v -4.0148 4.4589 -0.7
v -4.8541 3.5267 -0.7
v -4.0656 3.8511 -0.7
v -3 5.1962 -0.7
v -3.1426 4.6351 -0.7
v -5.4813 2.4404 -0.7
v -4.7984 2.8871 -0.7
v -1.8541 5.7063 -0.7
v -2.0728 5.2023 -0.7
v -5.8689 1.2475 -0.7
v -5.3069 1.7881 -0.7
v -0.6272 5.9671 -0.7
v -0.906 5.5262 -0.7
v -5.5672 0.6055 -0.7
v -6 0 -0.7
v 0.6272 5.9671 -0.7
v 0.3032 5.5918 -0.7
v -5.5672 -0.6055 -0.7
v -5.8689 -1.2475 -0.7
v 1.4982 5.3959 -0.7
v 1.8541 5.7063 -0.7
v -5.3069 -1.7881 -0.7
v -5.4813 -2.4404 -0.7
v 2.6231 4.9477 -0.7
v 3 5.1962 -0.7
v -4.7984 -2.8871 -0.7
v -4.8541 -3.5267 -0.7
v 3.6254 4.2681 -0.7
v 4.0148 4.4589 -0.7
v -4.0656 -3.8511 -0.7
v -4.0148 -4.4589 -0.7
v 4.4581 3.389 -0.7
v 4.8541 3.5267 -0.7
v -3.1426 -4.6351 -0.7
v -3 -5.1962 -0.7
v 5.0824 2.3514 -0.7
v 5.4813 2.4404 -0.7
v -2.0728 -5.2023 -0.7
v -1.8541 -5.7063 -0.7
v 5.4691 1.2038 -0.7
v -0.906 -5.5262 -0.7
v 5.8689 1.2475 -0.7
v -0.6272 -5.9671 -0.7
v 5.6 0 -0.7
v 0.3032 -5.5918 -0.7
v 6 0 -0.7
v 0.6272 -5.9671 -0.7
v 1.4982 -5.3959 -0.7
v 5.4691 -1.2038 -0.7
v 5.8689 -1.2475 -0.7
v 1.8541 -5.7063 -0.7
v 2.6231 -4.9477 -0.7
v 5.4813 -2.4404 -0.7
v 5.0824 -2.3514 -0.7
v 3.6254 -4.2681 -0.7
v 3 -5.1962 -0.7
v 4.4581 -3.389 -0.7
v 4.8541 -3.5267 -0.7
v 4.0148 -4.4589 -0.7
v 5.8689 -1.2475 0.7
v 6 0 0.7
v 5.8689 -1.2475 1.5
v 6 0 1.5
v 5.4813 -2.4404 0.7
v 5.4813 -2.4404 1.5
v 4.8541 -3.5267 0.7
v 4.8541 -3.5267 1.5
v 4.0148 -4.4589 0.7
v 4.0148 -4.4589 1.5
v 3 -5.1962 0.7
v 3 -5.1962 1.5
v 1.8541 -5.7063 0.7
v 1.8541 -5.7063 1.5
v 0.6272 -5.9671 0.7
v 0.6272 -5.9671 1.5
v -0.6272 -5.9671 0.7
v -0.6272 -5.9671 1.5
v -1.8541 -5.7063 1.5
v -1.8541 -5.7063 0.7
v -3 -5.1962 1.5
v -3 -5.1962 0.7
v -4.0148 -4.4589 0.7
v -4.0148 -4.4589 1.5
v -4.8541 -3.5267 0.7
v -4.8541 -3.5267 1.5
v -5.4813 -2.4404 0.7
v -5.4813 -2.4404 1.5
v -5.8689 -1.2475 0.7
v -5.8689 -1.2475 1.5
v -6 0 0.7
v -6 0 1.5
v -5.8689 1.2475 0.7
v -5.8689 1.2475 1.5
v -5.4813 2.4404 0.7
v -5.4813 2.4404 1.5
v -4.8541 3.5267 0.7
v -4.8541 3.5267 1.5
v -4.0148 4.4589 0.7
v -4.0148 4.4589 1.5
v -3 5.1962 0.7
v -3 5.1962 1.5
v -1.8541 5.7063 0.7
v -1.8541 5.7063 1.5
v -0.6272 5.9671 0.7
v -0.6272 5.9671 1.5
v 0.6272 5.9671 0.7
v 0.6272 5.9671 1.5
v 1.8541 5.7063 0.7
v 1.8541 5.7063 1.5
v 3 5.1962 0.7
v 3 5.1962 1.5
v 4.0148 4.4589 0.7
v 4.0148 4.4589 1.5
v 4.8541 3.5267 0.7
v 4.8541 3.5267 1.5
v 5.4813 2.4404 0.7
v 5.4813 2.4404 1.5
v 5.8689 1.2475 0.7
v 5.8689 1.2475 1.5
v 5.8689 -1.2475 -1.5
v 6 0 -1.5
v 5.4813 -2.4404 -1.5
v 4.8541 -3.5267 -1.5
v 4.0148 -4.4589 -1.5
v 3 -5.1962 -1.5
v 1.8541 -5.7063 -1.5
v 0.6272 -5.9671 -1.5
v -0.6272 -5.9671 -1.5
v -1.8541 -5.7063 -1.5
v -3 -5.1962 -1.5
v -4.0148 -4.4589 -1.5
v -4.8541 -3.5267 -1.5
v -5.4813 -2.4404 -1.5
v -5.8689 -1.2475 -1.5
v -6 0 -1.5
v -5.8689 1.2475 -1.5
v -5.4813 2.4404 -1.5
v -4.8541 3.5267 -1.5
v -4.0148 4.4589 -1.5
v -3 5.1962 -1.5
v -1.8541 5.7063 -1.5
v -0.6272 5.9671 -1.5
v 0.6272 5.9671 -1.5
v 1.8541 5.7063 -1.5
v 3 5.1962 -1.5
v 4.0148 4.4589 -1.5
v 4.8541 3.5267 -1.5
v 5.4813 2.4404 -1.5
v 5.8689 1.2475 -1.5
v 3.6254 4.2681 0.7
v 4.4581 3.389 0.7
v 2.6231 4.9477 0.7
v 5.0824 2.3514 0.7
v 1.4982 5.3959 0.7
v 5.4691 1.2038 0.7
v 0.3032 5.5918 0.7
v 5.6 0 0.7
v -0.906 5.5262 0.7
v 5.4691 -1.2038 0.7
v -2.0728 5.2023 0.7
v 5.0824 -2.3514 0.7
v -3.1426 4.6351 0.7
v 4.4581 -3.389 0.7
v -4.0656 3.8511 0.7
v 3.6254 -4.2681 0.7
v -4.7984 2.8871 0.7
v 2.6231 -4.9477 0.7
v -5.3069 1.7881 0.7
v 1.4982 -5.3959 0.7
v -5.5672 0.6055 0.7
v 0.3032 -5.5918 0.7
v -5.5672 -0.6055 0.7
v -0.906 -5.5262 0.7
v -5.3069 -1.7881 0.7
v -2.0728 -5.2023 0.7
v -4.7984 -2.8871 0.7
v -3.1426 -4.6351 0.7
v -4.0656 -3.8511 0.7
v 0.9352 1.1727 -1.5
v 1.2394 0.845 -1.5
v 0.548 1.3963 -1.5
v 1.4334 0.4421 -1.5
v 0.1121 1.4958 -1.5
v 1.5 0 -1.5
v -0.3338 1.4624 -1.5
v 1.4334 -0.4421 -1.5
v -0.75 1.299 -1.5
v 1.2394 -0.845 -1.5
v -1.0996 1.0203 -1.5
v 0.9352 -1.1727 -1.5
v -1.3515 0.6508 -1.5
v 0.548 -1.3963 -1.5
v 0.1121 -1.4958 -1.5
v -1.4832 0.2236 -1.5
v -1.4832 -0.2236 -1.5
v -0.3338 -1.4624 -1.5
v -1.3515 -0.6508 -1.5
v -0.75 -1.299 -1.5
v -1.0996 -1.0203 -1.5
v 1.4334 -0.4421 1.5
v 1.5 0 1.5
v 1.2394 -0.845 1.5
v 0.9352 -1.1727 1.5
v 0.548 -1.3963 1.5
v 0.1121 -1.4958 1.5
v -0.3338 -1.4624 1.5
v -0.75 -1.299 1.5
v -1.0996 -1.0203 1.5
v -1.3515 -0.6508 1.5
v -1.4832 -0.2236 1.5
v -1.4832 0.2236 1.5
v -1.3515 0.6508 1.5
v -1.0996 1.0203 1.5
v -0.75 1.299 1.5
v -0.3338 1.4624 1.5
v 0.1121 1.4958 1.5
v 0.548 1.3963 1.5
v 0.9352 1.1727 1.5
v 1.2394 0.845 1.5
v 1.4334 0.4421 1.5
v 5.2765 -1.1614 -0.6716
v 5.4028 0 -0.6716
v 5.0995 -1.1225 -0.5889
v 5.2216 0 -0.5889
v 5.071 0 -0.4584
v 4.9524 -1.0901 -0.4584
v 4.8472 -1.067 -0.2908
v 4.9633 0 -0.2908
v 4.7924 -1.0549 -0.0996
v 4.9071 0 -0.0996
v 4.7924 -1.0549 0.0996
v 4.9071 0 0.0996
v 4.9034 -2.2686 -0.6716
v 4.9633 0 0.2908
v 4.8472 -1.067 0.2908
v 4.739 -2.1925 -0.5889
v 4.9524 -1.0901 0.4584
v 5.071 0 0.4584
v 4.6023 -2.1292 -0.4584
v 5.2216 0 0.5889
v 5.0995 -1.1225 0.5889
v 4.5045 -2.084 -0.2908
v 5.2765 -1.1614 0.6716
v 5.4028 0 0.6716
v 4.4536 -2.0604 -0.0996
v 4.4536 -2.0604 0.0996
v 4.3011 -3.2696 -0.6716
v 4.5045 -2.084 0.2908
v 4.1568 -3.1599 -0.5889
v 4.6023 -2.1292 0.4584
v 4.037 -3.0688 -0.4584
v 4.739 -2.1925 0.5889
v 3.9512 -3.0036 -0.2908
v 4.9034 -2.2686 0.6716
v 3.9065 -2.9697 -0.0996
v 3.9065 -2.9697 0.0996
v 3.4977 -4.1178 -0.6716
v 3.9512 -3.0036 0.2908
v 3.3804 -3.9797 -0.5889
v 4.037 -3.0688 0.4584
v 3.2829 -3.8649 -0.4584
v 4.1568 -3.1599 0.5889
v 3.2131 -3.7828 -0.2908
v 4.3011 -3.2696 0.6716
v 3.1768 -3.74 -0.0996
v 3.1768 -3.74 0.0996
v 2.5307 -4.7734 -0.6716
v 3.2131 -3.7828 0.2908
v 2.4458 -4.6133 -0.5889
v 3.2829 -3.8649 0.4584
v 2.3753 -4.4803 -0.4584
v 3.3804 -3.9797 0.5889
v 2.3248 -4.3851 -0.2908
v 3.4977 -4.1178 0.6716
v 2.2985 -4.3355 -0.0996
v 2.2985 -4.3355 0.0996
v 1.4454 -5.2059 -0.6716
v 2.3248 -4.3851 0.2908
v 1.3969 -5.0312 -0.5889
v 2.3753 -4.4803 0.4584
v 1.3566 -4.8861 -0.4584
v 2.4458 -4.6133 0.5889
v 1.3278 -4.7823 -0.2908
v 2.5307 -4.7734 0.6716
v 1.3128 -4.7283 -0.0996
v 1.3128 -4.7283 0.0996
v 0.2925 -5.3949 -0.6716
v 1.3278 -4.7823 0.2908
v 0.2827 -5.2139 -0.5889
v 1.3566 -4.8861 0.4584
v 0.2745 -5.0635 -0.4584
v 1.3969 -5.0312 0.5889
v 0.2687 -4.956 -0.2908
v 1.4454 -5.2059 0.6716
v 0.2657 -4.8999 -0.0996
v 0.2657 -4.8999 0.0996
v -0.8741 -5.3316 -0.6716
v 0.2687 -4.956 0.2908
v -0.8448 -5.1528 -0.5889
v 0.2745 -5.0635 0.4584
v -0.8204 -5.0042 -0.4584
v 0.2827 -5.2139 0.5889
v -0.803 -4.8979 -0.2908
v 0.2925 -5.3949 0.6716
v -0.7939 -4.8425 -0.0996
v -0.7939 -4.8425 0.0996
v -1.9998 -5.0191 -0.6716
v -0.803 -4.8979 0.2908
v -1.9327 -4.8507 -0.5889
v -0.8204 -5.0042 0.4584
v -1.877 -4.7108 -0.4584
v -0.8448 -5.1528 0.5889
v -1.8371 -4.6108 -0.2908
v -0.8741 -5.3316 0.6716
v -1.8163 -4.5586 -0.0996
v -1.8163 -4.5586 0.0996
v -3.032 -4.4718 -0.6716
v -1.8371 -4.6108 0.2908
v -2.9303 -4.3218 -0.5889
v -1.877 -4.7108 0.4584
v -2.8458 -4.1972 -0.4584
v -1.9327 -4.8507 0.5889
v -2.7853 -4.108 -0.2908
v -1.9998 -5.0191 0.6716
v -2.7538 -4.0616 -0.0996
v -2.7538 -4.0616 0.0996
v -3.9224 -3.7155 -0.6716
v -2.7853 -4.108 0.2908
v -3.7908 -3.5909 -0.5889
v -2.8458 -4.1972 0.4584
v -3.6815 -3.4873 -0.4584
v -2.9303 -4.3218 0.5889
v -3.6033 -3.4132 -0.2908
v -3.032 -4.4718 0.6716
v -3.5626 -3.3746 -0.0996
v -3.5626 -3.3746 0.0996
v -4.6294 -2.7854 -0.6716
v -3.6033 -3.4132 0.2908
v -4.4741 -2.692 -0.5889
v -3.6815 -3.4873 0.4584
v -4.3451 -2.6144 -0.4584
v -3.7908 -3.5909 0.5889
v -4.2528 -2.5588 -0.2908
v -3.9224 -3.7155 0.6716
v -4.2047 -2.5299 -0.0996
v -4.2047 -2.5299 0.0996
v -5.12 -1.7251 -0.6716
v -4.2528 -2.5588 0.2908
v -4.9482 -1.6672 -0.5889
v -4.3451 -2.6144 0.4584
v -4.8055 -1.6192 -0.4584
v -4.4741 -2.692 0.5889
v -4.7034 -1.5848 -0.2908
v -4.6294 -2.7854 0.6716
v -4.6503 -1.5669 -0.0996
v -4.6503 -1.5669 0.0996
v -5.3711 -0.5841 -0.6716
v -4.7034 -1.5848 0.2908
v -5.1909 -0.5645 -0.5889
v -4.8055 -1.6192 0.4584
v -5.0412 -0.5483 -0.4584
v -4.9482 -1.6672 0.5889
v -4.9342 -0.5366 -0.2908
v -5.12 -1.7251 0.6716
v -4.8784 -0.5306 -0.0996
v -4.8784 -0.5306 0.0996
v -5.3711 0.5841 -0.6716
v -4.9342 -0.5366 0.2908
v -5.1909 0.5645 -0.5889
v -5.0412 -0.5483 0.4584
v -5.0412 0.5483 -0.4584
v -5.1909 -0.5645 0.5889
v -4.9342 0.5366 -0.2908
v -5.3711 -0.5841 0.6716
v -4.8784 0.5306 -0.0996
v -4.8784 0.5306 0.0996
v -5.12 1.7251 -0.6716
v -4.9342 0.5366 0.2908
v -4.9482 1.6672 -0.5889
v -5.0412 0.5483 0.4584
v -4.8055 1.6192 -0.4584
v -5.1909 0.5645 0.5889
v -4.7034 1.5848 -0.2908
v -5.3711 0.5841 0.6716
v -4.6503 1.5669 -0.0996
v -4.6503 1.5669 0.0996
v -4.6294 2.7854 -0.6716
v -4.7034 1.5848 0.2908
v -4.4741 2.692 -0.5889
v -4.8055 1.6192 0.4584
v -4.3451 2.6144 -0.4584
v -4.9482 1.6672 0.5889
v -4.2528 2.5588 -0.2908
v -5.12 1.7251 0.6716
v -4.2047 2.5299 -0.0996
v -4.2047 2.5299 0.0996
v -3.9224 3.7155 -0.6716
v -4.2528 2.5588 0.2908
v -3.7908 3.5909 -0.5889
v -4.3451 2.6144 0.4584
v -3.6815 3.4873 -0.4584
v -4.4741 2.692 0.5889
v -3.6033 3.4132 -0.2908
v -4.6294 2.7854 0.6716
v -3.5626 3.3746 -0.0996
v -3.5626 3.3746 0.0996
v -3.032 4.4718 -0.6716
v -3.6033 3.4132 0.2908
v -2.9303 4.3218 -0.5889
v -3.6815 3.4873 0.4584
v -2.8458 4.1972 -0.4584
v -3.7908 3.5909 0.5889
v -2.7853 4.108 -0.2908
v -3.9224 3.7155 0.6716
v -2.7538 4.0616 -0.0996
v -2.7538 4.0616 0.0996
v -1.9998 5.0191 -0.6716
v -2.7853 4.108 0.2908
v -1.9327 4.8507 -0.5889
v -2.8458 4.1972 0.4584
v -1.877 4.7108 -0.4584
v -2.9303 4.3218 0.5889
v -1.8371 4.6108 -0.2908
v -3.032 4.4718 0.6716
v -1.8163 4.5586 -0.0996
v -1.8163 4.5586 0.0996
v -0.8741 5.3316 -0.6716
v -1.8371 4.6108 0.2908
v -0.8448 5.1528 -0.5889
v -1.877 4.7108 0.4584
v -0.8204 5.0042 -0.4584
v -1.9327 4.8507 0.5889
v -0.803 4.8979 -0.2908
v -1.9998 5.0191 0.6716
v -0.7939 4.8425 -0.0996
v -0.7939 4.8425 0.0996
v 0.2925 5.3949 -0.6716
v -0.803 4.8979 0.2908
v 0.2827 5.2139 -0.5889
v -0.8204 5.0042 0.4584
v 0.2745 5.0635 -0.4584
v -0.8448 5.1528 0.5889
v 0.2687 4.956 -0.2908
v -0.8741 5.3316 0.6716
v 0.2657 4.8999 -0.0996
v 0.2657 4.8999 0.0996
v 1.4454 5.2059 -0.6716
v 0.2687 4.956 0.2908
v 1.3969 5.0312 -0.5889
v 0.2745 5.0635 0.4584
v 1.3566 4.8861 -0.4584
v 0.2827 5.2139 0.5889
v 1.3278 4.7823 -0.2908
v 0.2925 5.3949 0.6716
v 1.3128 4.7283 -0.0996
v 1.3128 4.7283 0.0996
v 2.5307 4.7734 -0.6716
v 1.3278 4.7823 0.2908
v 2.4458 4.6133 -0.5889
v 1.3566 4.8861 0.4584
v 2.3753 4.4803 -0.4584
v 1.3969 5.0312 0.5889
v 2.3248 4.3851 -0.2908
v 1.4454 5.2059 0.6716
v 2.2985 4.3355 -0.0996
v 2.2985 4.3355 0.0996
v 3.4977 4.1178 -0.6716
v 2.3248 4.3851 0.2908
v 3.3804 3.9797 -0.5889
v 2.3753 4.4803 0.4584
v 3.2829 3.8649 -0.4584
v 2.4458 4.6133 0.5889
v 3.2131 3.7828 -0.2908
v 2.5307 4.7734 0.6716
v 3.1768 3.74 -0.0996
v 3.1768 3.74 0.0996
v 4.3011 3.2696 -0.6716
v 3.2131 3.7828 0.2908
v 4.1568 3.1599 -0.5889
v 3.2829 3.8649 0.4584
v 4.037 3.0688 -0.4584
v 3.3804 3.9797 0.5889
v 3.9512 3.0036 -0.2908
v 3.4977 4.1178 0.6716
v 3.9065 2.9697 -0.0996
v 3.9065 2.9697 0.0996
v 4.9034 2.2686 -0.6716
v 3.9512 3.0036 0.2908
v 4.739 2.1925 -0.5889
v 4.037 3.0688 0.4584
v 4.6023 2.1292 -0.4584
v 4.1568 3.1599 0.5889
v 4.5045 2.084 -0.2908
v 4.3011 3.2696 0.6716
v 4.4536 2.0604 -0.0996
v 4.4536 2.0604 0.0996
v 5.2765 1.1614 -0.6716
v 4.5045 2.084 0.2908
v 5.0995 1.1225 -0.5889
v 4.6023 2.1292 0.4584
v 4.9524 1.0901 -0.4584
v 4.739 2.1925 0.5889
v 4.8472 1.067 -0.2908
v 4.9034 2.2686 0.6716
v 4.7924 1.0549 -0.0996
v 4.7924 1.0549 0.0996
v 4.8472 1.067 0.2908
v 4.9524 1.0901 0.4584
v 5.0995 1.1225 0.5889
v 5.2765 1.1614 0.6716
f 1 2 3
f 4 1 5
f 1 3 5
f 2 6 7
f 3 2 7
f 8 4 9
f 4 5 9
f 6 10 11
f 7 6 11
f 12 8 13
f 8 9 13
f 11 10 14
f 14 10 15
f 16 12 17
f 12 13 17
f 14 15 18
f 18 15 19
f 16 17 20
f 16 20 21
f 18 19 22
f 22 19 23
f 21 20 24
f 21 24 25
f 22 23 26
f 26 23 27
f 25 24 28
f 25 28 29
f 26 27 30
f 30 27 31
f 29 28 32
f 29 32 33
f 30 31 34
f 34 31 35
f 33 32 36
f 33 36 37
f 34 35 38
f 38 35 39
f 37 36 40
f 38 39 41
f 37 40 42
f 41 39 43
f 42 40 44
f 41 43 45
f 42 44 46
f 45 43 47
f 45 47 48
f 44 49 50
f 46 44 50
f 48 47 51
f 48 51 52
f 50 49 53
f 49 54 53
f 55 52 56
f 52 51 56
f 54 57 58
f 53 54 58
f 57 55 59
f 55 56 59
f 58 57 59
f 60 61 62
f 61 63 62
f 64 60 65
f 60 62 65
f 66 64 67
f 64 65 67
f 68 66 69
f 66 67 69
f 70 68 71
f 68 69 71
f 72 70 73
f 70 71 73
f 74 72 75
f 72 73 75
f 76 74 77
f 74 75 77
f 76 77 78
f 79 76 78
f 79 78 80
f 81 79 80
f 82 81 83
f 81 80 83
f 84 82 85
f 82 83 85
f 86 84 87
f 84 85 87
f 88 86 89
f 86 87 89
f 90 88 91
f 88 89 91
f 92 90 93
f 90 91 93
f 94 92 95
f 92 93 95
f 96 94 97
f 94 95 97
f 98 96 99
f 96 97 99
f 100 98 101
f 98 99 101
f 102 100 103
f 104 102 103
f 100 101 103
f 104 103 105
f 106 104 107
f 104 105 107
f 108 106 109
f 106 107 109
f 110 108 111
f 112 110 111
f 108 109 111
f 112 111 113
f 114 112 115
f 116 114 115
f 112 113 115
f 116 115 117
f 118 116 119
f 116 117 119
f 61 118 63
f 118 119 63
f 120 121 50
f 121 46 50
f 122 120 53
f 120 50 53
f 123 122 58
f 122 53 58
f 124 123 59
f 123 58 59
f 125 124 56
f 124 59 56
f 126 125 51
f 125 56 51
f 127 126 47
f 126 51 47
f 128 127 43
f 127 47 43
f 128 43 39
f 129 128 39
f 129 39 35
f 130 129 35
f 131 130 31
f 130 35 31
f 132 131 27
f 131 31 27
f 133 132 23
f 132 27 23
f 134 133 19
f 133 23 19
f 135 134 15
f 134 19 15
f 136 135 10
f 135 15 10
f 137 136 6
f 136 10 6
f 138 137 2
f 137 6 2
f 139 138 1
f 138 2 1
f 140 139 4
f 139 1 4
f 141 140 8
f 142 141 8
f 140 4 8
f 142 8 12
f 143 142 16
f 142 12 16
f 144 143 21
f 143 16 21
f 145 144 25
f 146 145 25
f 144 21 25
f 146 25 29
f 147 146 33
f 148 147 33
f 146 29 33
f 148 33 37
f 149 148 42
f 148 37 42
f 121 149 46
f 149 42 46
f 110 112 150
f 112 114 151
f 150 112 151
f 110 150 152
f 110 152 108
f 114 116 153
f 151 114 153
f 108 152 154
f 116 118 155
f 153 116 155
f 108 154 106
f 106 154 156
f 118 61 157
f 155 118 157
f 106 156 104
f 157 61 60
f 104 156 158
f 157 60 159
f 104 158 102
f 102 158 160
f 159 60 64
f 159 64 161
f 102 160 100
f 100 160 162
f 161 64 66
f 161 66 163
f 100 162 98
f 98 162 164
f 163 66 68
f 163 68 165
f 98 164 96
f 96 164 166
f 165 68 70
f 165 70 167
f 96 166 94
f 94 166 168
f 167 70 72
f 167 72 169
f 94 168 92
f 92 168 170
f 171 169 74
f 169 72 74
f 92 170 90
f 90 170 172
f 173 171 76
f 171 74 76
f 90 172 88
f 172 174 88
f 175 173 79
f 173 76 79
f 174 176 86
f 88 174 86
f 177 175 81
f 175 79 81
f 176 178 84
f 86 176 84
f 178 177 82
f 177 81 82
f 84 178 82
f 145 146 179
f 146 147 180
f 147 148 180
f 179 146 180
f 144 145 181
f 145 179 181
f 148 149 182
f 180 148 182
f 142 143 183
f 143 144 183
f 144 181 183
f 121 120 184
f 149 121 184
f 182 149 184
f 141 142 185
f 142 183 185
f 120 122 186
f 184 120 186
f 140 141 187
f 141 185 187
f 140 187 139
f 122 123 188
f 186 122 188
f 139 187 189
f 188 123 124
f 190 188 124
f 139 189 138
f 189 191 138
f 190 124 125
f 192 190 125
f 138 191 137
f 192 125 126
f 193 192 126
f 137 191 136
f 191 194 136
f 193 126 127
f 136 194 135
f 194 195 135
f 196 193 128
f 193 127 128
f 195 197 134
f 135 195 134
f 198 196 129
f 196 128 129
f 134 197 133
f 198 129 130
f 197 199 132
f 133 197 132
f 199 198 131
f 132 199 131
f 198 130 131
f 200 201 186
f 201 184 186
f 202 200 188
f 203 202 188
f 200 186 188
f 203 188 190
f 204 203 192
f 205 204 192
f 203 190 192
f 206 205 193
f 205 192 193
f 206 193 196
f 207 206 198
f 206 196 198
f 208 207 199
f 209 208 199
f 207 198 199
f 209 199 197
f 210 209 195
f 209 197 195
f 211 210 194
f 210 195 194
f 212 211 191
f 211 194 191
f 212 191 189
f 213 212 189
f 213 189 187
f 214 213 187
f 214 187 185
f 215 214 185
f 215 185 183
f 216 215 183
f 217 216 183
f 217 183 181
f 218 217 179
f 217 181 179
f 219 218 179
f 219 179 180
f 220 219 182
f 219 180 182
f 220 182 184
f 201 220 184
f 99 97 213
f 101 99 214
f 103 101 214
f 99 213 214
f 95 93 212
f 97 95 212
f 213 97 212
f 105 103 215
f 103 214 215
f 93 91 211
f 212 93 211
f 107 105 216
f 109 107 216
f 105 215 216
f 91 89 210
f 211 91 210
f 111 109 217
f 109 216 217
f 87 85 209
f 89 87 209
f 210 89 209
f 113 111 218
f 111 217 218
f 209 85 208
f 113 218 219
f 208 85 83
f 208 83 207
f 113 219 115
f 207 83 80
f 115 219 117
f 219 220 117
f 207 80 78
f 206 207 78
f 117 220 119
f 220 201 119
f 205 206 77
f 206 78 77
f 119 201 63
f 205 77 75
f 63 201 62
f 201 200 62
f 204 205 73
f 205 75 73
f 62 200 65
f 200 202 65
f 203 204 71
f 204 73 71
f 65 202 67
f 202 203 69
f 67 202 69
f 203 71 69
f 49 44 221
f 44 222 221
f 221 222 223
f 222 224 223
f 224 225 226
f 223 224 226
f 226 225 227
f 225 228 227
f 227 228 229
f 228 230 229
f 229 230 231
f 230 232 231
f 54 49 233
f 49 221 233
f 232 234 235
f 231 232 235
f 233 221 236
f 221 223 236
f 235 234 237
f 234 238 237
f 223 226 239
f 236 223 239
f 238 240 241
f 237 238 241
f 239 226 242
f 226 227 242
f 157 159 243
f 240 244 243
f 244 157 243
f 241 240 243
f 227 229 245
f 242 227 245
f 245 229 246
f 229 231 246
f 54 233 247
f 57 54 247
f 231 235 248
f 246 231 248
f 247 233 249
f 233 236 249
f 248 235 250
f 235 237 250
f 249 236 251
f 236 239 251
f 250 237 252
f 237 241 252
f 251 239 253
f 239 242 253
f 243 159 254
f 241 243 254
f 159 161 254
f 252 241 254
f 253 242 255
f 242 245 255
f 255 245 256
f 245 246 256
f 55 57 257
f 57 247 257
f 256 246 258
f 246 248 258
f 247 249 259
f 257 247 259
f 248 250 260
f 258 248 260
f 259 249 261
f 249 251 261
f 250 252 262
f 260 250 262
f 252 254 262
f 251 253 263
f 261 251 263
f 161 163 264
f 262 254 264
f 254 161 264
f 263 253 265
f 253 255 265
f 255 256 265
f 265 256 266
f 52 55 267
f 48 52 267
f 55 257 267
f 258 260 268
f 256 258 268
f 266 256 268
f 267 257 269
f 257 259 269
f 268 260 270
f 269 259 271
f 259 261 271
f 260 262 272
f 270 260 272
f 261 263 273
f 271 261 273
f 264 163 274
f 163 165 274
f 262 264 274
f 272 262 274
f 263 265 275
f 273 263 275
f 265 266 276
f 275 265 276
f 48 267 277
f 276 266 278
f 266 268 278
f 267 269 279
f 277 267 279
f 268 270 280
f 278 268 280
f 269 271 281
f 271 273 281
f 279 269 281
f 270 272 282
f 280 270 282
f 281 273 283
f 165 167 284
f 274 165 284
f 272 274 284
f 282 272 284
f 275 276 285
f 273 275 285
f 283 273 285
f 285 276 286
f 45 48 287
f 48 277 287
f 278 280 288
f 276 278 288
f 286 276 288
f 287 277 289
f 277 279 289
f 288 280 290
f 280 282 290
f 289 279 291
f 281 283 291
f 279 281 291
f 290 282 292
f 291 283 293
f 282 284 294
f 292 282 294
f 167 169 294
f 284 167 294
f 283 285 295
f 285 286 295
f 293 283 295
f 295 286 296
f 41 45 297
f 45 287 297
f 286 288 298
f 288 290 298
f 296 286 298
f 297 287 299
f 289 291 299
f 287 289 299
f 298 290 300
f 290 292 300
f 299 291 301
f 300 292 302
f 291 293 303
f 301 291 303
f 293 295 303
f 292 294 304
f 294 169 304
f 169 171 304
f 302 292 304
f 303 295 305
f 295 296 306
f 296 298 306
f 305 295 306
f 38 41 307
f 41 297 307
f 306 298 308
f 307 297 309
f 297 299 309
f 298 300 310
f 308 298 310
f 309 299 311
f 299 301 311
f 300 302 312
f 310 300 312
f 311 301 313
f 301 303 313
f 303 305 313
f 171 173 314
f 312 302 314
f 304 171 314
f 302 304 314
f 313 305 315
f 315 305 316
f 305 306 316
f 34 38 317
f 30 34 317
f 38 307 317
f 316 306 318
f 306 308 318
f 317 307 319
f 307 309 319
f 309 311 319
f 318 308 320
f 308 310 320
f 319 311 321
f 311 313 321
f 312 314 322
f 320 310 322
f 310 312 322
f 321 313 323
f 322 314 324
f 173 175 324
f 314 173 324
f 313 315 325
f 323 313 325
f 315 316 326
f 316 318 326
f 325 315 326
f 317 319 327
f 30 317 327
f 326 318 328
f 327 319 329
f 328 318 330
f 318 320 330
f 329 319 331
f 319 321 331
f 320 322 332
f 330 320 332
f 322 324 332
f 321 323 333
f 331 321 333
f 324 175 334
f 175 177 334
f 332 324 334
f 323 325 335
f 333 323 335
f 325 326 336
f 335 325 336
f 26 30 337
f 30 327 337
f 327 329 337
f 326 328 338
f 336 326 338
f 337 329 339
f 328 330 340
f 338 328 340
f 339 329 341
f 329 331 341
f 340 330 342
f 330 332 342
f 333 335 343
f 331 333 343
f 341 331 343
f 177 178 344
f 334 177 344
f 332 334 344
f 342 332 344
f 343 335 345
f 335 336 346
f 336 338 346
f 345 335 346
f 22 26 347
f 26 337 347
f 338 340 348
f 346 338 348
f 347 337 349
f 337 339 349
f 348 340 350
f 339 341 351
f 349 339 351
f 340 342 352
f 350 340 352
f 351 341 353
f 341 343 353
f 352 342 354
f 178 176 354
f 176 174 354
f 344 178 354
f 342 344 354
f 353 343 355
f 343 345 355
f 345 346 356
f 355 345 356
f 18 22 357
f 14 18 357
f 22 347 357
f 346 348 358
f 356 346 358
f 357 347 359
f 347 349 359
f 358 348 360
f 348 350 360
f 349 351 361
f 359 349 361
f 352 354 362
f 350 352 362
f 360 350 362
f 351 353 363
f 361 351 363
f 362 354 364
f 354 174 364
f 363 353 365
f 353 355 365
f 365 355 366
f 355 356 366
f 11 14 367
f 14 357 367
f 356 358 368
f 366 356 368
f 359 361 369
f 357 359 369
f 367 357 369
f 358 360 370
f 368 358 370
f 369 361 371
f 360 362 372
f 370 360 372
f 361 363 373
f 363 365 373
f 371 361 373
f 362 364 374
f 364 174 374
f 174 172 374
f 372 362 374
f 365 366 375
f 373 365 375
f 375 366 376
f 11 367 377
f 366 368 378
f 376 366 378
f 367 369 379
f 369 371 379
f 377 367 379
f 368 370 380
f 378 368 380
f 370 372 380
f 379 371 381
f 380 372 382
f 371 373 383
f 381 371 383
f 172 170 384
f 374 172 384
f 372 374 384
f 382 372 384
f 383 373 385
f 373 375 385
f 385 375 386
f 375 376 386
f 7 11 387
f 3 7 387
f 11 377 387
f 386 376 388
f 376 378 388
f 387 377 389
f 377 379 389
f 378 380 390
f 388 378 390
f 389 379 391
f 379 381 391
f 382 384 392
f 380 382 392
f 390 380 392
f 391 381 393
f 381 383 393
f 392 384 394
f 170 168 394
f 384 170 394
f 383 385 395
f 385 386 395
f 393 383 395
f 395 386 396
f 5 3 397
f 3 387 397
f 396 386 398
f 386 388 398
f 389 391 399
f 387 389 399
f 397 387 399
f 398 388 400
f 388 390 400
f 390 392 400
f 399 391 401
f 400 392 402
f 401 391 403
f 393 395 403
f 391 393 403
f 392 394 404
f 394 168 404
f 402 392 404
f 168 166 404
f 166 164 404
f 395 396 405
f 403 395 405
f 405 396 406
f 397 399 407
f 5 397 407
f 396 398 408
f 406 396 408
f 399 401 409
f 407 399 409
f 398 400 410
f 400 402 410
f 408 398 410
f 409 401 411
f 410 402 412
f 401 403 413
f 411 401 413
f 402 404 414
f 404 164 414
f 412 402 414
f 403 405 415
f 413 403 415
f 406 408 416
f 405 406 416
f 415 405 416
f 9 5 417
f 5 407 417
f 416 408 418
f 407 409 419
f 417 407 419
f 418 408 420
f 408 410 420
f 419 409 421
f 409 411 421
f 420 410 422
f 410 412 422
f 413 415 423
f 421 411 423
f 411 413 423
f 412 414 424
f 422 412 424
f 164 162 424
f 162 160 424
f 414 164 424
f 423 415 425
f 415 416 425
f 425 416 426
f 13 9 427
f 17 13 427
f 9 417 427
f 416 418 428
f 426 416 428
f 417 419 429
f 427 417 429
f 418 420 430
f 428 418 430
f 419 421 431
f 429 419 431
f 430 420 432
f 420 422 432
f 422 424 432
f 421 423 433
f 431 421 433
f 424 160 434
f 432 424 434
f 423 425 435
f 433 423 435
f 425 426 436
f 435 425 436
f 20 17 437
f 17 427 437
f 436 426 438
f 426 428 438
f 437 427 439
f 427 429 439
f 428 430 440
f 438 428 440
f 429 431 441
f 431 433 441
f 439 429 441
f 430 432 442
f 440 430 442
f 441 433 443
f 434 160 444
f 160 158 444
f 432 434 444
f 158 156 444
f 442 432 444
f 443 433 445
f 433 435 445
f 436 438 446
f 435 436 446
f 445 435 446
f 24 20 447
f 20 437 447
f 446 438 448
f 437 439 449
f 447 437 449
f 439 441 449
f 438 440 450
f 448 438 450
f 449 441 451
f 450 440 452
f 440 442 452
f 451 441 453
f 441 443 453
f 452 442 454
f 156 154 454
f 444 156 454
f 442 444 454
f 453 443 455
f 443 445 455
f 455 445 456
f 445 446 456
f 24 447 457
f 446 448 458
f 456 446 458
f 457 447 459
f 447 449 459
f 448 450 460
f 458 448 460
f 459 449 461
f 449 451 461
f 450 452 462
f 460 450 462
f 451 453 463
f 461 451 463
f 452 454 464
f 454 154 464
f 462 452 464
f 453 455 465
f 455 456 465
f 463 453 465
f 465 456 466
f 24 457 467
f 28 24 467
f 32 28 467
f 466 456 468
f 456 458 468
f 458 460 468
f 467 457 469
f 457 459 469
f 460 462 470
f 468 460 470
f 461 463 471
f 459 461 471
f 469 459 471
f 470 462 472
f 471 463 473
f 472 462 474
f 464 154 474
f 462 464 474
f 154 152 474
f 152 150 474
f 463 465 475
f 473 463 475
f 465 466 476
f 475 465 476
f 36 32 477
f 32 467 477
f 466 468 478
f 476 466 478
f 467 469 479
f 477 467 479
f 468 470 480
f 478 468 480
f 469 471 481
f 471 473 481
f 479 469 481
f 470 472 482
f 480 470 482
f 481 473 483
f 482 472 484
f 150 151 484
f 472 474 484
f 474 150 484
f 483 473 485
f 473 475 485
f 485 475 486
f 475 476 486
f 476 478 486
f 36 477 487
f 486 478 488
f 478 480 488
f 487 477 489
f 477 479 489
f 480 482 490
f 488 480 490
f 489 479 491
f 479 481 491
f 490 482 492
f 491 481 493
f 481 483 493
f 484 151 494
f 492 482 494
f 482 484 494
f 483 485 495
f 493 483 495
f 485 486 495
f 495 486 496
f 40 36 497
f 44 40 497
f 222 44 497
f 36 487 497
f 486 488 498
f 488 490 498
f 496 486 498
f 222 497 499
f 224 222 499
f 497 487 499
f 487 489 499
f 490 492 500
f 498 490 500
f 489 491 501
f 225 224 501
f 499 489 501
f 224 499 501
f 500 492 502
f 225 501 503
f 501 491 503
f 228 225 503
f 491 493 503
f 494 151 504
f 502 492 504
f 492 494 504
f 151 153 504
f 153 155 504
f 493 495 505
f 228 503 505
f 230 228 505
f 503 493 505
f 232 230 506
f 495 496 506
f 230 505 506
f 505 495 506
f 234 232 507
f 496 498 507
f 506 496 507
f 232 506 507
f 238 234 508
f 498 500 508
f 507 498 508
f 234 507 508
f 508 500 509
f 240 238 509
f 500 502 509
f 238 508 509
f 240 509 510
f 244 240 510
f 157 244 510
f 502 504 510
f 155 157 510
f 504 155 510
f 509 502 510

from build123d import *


with BuildPart() as part:
    # Sketch1 → Revolve1 (revolve)
    with BuildSketch(Plane(origin=(0, 0, 0), x_dir=(0, 0, -1), z_dir=(1, 0, 0)), mode=Mode.PRIVATE) as revolve1_sk:
        with BuildLine():
            ThreePointArc((0.7, 5.6), (0, 4.9), (-0.7, 5.6))
            Line((-0.7, 5.6), (-0.7, 6))
            Line((-0.7, 6), (-1.5, 6))
            Line((-1.5, 6), (-1.5, 1.5))
            Line((-1.5, 1.5), (1.5, 1.5))
            Line((1.5, 1.5), (1.5, 6))
            Line((1.5, 6), (0.7, 6))
            Line((0.7, 6), (0.7, 5.6))
        make_face()
    revolve(revolve1_sk.sketch.rotate(Axis((0, 0, 1.5), (0, 0, -1)), 90), axis=Axis((0, 0, 1.5), (0, 0, -1)))


solid = part.part
